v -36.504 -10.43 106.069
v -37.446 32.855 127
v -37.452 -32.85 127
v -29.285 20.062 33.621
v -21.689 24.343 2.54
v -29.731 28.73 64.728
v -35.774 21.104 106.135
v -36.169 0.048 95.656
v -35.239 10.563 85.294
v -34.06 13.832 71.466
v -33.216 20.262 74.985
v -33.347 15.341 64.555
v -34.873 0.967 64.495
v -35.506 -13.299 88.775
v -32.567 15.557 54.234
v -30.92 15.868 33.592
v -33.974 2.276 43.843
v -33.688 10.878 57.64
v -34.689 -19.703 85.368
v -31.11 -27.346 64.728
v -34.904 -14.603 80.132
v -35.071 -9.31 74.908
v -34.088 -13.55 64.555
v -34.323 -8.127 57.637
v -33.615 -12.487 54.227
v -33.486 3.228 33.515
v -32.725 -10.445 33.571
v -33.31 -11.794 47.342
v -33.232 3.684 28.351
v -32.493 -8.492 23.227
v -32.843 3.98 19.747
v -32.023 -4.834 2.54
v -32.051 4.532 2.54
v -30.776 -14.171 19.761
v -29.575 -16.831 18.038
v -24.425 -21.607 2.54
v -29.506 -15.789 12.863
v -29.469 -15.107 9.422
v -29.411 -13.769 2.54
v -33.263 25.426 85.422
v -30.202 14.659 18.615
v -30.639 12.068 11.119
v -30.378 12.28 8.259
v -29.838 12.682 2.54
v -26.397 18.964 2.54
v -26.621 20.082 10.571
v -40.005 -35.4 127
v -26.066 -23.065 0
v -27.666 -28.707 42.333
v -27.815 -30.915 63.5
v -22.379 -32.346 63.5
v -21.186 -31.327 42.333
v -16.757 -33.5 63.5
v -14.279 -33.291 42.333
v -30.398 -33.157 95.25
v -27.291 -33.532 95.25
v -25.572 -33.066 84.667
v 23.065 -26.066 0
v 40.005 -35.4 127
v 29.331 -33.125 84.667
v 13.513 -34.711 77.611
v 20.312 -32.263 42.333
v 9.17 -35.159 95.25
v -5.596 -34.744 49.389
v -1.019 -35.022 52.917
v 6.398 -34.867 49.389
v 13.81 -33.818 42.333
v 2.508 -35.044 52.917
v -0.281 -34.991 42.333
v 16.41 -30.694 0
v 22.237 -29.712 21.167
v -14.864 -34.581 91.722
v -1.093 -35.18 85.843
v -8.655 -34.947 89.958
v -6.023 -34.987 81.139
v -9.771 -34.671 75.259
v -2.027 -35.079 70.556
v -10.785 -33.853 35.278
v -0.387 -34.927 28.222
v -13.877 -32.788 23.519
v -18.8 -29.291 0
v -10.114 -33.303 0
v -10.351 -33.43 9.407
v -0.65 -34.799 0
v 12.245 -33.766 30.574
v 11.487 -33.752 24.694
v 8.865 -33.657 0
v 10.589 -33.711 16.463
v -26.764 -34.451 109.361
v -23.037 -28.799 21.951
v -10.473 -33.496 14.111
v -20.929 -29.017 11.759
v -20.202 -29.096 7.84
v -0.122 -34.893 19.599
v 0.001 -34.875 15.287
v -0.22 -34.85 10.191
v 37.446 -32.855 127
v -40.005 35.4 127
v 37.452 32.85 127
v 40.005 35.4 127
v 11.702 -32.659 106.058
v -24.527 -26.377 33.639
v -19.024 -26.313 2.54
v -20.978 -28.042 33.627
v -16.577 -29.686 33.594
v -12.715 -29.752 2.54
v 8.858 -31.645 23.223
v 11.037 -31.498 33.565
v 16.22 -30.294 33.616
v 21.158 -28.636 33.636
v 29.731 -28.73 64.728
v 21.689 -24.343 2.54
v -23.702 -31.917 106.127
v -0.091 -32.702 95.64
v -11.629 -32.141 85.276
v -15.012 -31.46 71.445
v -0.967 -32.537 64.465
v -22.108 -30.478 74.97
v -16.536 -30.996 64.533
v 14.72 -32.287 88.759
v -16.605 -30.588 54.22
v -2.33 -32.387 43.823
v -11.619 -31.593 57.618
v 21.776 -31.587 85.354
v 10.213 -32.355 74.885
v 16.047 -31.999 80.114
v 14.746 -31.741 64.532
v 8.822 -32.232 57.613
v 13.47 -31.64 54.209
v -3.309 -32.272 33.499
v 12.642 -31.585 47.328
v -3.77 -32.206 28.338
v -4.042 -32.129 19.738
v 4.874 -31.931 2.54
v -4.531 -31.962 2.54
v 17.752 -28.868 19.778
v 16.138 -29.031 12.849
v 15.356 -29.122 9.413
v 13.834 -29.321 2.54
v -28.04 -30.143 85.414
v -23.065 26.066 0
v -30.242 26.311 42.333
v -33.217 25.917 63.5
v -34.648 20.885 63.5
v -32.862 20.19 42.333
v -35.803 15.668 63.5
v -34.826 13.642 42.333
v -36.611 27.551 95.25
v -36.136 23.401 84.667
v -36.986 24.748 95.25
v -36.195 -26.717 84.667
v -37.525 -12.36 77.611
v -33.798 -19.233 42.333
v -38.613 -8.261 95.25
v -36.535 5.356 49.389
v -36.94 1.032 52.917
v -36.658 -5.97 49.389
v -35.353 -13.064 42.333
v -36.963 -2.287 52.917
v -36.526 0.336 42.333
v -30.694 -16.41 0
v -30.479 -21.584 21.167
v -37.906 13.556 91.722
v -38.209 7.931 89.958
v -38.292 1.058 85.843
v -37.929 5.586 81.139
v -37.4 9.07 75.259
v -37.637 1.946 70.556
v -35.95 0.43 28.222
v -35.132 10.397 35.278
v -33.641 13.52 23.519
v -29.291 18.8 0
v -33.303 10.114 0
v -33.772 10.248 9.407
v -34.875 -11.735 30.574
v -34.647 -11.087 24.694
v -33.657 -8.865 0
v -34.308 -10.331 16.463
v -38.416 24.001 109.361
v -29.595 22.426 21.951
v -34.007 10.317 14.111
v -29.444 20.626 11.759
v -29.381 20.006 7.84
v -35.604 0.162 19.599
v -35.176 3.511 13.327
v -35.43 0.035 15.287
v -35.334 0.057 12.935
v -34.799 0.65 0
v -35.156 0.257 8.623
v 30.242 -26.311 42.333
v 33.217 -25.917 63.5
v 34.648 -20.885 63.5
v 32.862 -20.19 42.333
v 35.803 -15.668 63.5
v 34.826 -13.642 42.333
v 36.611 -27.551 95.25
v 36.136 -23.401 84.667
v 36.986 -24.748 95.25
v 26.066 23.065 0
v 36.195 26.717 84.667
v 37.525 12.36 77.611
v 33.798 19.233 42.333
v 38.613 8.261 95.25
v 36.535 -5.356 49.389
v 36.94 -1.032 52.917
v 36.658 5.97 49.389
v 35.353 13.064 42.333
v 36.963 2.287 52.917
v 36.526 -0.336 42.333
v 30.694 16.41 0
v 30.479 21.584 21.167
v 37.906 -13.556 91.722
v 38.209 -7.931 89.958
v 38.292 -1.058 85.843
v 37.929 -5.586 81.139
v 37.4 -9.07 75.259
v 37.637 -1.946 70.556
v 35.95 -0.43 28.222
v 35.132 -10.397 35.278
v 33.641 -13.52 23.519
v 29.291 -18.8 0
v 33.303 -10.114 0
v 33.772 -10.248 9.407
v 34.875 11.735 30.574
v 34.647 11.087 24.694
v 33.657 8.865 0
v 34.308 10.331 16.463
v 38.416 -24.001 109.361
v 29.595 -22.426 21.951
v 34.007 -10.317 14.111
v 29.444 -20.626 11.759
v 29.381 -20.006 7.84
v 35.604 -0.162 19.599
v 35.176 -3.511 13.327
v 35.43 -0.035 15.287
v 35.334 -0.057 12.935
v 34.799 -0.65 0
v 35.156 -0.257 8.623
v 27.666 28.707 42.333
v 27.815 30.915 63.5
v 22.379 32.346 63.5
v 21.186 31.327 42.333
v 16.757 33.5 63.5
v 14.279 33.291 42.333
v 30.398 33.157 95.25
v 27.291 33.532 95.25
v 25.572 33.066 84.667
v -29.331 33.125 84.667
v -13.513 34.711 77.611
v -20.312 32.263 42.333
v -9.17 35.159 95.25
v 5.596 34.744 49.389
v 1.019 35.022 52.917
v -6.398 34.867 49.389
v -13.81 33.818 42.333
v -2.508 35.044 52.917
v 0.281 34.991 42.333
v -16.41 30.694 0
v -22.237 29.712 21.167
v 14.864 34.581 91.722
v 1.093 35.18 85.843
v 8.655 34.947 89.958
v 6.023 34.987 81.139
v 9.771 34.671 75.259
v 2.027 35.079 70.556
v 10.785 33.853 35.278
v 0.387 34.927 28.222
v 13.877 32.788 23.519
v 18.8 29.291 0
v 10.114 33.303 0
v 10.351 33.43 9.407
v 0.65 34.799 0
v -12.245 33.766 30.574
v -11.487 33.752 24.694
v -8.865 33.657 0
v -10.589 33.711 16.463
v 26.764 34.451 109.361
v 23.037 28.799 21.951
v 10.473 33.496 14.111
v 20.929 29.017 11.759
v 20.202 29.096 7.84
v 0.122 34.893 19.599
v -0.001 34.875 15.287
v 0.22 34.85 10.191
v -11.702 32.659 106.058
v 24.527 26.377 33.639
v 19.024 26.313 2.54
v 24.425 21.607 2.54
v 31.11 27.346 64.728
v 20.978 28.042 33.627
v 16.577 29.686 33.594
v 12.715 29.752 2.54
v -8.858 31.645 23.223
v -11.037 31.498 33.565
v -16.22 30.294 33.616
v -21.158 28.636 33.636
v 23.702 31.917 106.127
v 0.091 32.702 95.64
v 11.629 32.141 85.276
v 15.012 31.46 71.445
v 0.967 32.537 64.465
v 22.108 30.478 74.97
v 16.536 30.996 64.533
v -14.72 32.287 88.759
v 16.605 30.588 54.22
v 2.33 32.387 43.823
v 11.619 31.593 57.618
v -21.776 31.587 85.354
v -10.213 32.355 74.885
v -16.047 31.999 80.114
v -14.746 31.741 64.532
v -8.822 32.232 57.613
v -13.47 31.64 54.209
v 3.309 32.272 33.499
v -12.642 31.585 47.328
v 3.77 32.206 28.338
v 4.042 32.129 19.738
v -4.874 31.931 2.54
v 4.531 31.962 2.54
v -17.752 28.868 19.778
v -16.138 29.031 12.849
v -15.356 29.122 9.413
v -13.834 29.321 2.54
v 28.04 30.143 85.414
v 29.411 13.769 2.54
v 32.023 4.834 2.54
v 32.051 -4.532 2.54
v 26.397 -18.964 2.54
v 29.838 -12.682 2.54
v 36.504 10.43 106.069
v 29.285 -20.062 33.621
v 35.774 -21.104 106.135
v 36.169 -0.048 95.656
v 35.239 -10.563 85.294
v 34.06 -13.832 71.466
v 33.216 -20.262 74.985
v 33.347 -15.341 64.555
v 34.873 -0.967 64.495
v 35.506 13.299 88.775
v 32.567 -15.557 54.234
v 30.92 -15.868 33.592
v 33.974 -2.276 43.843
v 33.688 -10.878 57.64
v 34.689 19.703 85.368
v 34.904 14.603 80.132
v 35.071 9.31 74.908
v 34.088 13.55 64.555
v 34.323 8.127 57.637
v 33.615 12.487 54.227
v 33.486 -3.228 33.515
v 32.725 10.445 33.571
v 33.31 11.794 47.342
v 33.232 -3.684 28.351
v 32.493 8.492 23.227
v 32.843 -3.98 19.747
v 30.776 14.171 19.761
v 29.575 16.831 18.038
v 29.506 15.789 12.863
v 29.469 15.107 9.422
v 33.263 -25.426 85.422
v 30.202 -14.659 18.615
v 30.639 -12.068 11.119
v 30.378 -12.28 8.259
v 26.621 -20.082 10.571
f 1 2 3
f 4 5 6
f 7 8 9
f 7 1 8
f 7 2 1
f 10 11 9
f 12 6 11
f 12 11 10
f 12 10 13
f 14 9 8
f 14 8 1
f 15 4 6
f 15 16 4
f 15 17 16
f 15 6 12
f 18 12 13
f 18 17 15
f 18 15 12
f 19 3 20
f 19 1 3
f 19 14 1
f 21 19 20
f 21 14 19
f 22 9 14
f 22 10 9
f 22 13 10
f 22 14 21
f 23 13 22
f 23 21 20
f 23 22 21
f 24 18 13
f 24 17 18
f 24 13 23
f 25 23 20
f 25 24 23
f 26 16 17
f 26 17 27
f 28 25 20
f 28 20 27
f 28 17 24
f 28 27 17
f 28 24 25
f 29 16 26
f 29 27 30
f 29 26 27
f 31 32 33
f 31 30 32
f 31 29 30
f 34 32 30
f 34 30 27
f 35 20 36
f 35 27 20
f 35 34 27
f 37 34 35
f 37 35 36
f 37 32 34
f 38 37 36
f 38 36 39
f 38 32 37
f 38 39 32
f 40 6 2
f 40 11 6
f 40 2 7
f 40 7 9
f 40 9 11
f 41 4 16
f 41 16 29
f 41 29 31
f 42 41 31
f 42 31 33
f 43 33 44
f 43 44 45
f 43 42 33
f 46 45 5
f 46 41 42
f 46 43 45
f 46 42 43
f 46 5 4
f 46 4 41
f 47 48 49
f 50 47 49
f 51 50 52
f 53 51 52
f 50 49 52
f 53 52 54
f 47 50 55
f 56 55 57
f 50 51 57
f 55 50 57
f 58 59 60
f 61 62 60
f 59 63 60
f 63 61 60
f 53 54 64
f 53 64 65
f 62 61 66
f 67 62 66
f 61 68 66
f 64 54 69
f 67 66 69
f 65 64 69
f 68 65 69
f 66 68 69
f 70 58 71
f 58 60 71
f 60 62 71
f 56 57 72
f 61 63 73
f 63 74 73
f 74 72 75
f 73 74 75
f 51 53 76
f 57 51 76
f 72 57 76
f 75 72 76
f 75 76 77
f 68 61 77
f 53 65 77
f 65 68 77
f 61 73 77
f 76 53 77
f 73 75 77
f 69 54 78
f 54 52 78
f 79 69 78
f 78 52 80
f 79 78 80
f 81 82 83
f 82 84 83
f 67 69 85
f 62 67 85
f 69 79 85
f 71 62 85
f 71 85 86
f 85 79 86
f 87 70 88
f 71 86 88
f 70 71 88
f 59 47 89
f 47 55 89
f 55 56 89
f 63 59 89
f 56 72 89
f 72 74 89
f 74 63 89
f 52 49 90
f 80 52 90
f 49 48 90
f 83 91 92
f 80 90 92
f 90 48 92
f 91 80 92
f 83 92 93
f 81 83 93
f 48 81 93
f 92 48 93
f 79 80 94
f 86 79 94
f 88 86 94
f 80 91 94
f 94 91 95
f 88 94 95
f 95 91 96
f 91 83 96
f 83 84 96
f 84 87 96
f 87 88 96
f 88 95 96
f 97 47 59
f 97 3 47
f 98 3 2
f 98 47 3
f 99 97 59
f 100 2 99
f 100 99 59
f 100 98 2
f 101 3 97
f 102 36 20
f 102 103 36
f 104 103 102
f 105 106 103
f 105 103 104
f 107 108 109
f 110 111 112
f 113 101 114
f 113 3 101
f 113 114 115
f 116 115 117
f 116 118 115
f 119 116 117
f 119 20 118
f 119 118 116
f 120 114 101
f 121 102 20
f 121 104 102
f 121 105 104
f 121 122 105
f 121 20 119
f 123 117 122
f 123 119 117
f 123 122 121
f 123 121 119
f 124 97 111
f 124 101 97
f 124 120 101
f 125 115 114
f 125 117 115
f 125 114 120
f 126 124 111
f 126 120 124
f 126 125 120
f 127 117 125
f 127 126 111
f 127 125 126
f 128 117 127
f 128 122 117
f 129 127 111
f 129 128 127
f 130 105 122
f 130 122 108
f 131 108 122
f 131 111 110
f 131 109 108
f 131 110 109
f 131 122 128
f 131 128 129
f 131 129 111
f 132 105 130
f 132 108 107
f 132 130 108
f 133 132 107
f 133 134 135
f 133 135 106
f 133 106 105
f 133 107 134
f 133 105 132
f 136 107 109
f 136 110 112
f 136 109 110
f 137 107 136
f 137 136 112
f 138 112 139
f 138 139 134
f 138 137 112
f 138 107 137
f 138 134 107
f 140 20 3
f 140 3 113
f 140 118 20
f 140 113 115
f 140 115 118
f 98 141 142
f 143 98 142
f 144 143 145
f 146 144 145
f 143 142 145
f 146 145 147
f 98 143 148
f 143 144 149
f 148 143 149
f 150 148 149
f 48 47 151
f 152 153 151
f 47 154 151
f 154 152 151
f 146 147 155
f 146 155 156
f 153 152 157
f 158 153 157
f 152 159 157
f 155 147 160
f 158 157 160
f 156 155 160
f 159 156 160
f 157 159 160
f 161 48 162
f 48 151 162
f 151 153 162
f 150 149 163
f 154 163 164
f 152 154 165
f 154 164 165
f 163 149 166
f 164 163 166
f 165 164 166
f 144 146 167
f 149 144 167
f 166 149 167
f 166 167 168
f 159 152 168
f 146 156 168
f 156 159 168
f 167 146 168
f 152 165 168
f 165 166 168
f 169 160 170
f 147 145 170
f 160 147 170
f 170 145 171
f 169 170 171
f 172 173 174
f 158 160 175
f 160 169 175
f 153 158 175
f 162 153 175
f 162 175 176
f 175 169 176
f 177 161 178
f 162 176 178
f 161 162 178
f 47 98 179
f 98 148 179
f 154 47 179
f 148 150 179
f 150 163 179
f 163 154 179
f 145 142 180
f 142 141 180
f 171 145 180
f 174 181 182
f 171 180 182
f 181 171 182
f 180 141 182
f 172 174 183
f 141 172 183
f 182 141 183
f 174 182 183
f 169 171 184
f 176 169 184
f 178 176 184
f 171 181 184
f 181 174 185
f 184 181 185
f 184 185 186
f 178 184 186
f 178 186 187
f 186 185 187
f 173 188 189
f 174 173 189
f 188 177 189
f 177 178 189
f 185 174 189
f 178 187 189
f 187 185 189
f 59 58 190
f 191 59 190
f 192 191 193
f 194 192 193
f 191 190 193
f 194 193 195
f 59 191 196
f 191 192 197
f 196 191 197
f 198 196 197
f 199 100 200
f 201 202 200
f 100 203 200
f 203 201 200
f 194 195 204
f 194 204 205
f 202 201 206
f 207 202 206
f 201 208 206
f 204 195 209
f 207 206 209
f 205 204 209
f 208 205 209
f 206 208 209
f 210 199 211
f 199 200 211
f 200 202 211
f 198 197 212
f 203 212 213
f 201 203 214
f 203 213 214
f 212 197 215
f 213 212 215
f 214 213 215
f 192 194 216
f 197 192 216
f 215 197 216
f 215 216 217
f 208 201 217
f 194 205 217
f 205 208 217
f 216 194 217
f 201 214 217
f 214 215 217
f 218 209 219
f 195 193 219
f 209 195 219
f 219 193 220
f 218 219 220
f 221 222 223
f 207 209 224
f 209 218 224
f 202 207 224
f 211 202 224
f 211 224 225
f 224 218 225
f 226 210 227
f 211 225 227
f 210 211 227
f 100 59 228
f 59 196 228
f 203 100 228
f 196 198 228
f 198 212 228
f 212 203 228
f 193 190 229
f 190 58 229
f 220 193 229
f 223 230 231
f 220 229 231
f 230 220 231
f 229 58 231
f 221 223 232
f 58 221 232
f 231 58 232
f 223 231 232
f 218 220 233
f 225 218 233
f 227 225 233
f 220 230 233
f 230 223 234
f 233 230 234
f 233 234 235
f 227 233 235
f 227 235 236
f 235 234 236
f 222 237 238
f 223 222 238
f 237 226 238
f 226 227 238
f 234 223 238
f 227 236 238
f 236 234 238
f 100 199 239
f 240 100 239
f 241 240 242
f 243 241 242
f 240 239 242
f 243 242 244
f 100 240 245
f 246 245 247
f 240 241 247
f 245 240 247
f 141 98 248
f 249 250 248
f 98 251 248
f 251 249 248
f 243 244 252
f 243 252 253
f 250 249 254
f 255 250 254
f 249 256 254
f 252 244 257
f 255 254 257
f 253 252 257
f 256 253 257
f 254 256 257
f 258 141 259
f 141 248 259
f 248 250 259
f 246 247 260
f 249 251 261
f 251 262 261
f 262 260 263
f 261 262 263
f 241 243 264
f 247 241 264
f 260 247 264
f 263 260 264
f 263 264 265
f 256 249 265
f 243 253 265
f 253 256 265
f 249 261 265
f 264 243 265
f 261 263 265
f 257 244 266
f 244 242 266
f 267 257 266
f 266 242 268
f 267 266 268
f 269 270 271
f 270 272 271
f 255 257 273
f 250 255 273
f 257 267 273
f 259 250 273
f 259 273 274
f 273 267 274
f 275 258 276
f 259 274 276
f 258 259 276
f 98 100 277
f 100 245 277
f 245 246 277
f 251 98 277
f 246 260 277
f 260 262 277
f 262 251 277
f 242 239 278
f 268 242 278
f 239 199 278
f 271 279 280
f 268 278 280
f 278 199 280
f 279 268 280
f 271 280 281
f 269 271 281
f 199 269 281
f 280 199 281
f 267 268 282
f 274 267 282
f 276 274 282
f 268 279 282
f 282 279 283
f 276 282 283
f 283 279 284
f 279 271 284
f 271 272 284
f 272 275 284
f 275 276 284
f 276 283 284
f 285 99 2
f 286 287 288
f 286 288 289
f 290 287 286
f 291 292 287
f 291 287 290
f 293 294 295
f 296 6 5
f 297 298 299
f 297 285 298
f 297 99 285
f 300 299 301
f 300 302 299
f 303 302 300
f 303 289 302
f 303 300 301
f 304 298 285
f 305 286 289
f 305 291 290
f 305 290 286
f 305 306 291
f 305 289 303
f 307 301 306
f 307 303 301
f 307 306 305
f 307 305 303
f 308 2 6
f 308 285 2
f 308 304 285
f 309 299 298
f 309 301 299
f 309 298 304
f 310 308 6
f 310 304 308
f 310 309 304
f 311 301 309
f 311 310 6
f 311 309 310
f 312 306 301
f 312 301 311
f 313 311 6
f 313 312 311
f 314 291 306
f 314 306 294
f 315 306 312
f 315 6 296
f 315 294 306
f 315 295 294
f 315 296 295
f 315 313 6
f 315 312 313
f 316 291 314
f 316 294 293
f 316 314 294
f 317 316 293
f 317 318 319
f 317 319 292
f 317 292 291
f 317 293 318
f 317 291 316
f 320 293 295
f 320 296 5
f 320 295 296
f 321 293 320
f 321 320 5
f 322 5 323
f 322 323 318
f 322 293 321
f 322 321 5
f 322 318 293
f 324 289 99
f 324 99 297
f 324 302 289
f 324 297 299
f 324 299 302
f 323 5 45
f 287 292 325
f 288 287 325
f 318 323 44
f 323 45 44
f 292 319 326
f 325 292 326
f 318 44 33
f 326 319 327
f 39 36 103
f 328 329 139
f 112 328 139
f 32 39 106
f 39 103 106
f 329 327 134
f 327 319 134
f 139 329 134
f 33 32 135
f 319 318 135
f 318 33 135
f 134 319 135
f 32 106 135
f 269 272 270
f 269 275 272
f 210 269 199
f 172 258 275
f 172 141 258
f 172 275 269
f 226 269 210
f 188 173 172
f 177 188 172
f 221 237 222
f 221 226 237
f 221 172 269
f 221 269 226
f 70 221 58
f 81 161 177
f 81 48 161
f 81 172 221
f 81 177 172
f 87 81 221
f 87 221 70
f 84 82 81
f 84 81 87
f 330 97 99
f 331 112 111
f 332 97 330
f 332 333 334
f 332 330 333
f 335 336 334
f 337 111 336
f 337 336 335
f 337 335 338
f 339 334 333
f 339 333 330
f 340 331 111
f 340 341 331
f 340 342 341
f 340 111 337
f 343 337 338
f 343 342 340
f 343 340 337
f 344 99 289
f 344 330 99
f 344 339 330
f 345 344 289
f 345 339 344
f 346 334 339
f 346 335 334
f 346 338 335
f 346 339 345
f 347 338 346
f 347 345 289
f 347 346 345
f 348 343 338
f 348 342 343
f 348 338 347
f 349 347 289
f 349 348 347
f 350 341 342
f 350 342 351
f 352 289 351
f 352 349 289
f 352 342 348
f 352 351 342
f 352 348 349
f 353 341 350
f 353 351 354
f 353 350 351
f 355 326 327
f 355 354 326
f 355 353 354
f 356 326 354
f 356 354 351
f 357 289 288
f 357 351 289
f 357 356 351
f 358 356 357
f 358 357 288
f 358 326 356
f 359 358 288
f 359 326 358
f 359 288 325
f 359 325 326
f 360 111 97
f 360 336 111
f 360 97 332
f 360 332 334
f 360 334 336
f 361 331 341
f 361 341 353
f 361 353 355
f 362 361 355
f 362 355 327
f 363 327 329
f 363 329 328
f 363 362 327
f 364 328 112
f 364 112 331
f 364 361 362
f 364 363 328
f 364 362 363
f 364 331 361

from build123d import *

# Parameters (mm, degrees)
F2_W = 80.009996891
F2_H = 70.8002150059
F4_T = 2.54


# Not quite as in the source:
# - the arcs of a loft's sections are written as splines that run evenly, so that the points pair up as in the source's solid
# - a shell that OpenCascade refuses in one call is made with other operations: the cavity is built on its own and cut out


with BuildPart() as f3:
    # F2 (on offset) → F3 section 0
    with BuildSketch(Plane.XY.offset(127)):
        Rectangle(F2_W, F2_H)
    # F0 (on Top) → F3 section 1
    with BuildSketch(Plane.XY):
        with BuildLine():
            add(Edge.make_bspline(
                [(26.065590987, 23.0652358186), (24.5559748328, 24.7712247593), (22.8783749167, 26.3284909791), (19.2515124469, 29.085885659), (17.3023395745, 30.2859459372), (13.2072252341, 32.2827922844), (11.0613850258, 33.0795289775), (6.6553917622, 34.2390893068), (4.3953476538, 34.6018842705), (-0.1522046827, 34.8795973285), (-2.4396004636, 34.7945085558), (-6.953951987, 34.1797019856), (-9.1807961033, 33.6499993904), (-13.4884628163, 32.1662998637), (-15.5691788974, 31.2123396195), (-19.5046195839, 28.916764877), (-21.3592468778, 27.5752071412), (-23.0652358186, 26.065590987)],
                knots=[0, 0, 0, 0, 0.125, 0.125, 0.25, 0.25, 0.375, 0.375, 0.5, 0.5, 0.625, 0.625, 0.75, 0.75, 0.875, 0.875, 1, 1, 1, 1], degree=3))
            add(Edge.make_bspline(
                [(-23.0652358186, 26.065590987), (-24.7712247593, 24.5559748328), (-26.3284909791, 22.8783749167), (-29.085885659, 19.2515124469), (-30.2859459372, 17.3023395745), (-32.2827922844, 13.2072252341), (-33.0795289775, 11.0613850258), (-34.2390893068, 6.6553917622), (-34.6018842705, 4.3953476538), (-34.8795973285, -0.1522046827), (-34.7945085558, -2.4396004636), (-34.1797019856, -6.953951987), (-33.6499993904, -9.1807961033), (-32.1662998637, -13.4884628163), (-31.2123396195, -15.5691788974), (-28.916764877, -19.5046195839), (-27.5752071412, -21.3592468778), (-26.065590987, -23.0652358186)],
                knots=[0, 0, 0, 0, 0.125, 0.125, 0.25, 0.25, 0.375, 0.375, 0.5, 0.5, 0.625, 0.625, 0.75, 0.75, 0.875, 0.875, 1, 1, 1, 1], degree=3))
            add(Edge.make_bspline(
                [(-26.065590987, -23.0652358186), (-24.5559748328, -24.7712247593), (-22.8783749167, -26.3284909791), (-19.2515124469, -29.085885659), (-17.3023395745, -30.2859459372), (-13.2072252341, -32.2827922844), (-11.0613850258, -33.0795289775), (-6.6553917622, -34.2390893068), (-4.3953476538, -34.6018842705), (0.1522046827, -34.8795973285), (2.4396004636, -34.7945085558), (6.953951987, -34.1797019856), (9.1807961033, -33.6499993904), (13.4884628163, -32.1662998637), (15.5691788974, -31.2123396195), (19.5046195839, -28.916764877), (21.3592468778, -27.5752071412), (23.0652358186, -26.065590987)],
                knots=[0, 0, 0, 0, 0.125, 0.125, 0.25, 0.25, 0.375, 0.375, 0.5, 0.5, 0.625, 0.625, 0.75, 0.75, 0.875, 0.875, 1, 1, 1, 1], degree=3))
            add(Edge.make_bspline(
                [(23.0652358186, -26.065590987), (24.7712247593, -24.5559748328), (26.3284909791, -22.8783749167), (29.085885659, -19.2515124469), (30.2859459372, -17.3023395745), (32.2827922844, -13.2072252341), (33.0795289775, -11.0613850258), (34.2390893068, -6.6553917622), (34.6018842705, -4.3953476538), (34.8795973285, 0.1522046827), (34.7945085558, 2.4396004636), (34.1797019856, 6.953951987), (33.6499993904, 9.1807961033), (32.1662998637, 13.4884628163), (31.2123396195, 15.5691788974), (28.916764877, 19.5046195839), (27.5752071412, 21.3592468778), (26.065590987, 23.0652358186)],
                knots=[0, 0, 0, 0, 0.125, 0.125, 0.25, 0.25, 0.375, 0.375, 0.5, 0.5, 0.625, 0.625, 0.75, 0.75, 0.875, 0.875, 1, 1, 1, 1], degree=3))
        make_face()
    loft(ruled=True)

    # F4: shell of thickness 2.54, made by hand


with BuildPart() as f4_core1:
    # F4_t2: copy of F3
    add(f3.part)

    # the walls: a layer under each face that stays
    f4_faces = [f4_core1.faces().sort_by_distance(p)[0] for p in [
        (37.3728696225, -1.0607857428, 63.5),
        (1.0607857428, 35.0704241512, 63.5),
        (-37.3728696225, 1.0607857428, 63.5),
        (-1.0607857428, -35.0704241512, 63.5),
        (0, 0, 0),
    ]]
    thicken(f4_faces, amount=-F4_T, mode=Mode.SUBTRACT)


with BuildPart() as f3_1:
    add(f3.part)

    # what is left inside the walls is the cavity
    f4_cavity = [f4_core1.part.solids().sort_by_distance(p)[0] for p in [
        (-0.656082, -32.618968, 85.395704),
    ]]
    add(f4_cavity, mode=Mode.SUBTRACT)


solid = f3_1.part
